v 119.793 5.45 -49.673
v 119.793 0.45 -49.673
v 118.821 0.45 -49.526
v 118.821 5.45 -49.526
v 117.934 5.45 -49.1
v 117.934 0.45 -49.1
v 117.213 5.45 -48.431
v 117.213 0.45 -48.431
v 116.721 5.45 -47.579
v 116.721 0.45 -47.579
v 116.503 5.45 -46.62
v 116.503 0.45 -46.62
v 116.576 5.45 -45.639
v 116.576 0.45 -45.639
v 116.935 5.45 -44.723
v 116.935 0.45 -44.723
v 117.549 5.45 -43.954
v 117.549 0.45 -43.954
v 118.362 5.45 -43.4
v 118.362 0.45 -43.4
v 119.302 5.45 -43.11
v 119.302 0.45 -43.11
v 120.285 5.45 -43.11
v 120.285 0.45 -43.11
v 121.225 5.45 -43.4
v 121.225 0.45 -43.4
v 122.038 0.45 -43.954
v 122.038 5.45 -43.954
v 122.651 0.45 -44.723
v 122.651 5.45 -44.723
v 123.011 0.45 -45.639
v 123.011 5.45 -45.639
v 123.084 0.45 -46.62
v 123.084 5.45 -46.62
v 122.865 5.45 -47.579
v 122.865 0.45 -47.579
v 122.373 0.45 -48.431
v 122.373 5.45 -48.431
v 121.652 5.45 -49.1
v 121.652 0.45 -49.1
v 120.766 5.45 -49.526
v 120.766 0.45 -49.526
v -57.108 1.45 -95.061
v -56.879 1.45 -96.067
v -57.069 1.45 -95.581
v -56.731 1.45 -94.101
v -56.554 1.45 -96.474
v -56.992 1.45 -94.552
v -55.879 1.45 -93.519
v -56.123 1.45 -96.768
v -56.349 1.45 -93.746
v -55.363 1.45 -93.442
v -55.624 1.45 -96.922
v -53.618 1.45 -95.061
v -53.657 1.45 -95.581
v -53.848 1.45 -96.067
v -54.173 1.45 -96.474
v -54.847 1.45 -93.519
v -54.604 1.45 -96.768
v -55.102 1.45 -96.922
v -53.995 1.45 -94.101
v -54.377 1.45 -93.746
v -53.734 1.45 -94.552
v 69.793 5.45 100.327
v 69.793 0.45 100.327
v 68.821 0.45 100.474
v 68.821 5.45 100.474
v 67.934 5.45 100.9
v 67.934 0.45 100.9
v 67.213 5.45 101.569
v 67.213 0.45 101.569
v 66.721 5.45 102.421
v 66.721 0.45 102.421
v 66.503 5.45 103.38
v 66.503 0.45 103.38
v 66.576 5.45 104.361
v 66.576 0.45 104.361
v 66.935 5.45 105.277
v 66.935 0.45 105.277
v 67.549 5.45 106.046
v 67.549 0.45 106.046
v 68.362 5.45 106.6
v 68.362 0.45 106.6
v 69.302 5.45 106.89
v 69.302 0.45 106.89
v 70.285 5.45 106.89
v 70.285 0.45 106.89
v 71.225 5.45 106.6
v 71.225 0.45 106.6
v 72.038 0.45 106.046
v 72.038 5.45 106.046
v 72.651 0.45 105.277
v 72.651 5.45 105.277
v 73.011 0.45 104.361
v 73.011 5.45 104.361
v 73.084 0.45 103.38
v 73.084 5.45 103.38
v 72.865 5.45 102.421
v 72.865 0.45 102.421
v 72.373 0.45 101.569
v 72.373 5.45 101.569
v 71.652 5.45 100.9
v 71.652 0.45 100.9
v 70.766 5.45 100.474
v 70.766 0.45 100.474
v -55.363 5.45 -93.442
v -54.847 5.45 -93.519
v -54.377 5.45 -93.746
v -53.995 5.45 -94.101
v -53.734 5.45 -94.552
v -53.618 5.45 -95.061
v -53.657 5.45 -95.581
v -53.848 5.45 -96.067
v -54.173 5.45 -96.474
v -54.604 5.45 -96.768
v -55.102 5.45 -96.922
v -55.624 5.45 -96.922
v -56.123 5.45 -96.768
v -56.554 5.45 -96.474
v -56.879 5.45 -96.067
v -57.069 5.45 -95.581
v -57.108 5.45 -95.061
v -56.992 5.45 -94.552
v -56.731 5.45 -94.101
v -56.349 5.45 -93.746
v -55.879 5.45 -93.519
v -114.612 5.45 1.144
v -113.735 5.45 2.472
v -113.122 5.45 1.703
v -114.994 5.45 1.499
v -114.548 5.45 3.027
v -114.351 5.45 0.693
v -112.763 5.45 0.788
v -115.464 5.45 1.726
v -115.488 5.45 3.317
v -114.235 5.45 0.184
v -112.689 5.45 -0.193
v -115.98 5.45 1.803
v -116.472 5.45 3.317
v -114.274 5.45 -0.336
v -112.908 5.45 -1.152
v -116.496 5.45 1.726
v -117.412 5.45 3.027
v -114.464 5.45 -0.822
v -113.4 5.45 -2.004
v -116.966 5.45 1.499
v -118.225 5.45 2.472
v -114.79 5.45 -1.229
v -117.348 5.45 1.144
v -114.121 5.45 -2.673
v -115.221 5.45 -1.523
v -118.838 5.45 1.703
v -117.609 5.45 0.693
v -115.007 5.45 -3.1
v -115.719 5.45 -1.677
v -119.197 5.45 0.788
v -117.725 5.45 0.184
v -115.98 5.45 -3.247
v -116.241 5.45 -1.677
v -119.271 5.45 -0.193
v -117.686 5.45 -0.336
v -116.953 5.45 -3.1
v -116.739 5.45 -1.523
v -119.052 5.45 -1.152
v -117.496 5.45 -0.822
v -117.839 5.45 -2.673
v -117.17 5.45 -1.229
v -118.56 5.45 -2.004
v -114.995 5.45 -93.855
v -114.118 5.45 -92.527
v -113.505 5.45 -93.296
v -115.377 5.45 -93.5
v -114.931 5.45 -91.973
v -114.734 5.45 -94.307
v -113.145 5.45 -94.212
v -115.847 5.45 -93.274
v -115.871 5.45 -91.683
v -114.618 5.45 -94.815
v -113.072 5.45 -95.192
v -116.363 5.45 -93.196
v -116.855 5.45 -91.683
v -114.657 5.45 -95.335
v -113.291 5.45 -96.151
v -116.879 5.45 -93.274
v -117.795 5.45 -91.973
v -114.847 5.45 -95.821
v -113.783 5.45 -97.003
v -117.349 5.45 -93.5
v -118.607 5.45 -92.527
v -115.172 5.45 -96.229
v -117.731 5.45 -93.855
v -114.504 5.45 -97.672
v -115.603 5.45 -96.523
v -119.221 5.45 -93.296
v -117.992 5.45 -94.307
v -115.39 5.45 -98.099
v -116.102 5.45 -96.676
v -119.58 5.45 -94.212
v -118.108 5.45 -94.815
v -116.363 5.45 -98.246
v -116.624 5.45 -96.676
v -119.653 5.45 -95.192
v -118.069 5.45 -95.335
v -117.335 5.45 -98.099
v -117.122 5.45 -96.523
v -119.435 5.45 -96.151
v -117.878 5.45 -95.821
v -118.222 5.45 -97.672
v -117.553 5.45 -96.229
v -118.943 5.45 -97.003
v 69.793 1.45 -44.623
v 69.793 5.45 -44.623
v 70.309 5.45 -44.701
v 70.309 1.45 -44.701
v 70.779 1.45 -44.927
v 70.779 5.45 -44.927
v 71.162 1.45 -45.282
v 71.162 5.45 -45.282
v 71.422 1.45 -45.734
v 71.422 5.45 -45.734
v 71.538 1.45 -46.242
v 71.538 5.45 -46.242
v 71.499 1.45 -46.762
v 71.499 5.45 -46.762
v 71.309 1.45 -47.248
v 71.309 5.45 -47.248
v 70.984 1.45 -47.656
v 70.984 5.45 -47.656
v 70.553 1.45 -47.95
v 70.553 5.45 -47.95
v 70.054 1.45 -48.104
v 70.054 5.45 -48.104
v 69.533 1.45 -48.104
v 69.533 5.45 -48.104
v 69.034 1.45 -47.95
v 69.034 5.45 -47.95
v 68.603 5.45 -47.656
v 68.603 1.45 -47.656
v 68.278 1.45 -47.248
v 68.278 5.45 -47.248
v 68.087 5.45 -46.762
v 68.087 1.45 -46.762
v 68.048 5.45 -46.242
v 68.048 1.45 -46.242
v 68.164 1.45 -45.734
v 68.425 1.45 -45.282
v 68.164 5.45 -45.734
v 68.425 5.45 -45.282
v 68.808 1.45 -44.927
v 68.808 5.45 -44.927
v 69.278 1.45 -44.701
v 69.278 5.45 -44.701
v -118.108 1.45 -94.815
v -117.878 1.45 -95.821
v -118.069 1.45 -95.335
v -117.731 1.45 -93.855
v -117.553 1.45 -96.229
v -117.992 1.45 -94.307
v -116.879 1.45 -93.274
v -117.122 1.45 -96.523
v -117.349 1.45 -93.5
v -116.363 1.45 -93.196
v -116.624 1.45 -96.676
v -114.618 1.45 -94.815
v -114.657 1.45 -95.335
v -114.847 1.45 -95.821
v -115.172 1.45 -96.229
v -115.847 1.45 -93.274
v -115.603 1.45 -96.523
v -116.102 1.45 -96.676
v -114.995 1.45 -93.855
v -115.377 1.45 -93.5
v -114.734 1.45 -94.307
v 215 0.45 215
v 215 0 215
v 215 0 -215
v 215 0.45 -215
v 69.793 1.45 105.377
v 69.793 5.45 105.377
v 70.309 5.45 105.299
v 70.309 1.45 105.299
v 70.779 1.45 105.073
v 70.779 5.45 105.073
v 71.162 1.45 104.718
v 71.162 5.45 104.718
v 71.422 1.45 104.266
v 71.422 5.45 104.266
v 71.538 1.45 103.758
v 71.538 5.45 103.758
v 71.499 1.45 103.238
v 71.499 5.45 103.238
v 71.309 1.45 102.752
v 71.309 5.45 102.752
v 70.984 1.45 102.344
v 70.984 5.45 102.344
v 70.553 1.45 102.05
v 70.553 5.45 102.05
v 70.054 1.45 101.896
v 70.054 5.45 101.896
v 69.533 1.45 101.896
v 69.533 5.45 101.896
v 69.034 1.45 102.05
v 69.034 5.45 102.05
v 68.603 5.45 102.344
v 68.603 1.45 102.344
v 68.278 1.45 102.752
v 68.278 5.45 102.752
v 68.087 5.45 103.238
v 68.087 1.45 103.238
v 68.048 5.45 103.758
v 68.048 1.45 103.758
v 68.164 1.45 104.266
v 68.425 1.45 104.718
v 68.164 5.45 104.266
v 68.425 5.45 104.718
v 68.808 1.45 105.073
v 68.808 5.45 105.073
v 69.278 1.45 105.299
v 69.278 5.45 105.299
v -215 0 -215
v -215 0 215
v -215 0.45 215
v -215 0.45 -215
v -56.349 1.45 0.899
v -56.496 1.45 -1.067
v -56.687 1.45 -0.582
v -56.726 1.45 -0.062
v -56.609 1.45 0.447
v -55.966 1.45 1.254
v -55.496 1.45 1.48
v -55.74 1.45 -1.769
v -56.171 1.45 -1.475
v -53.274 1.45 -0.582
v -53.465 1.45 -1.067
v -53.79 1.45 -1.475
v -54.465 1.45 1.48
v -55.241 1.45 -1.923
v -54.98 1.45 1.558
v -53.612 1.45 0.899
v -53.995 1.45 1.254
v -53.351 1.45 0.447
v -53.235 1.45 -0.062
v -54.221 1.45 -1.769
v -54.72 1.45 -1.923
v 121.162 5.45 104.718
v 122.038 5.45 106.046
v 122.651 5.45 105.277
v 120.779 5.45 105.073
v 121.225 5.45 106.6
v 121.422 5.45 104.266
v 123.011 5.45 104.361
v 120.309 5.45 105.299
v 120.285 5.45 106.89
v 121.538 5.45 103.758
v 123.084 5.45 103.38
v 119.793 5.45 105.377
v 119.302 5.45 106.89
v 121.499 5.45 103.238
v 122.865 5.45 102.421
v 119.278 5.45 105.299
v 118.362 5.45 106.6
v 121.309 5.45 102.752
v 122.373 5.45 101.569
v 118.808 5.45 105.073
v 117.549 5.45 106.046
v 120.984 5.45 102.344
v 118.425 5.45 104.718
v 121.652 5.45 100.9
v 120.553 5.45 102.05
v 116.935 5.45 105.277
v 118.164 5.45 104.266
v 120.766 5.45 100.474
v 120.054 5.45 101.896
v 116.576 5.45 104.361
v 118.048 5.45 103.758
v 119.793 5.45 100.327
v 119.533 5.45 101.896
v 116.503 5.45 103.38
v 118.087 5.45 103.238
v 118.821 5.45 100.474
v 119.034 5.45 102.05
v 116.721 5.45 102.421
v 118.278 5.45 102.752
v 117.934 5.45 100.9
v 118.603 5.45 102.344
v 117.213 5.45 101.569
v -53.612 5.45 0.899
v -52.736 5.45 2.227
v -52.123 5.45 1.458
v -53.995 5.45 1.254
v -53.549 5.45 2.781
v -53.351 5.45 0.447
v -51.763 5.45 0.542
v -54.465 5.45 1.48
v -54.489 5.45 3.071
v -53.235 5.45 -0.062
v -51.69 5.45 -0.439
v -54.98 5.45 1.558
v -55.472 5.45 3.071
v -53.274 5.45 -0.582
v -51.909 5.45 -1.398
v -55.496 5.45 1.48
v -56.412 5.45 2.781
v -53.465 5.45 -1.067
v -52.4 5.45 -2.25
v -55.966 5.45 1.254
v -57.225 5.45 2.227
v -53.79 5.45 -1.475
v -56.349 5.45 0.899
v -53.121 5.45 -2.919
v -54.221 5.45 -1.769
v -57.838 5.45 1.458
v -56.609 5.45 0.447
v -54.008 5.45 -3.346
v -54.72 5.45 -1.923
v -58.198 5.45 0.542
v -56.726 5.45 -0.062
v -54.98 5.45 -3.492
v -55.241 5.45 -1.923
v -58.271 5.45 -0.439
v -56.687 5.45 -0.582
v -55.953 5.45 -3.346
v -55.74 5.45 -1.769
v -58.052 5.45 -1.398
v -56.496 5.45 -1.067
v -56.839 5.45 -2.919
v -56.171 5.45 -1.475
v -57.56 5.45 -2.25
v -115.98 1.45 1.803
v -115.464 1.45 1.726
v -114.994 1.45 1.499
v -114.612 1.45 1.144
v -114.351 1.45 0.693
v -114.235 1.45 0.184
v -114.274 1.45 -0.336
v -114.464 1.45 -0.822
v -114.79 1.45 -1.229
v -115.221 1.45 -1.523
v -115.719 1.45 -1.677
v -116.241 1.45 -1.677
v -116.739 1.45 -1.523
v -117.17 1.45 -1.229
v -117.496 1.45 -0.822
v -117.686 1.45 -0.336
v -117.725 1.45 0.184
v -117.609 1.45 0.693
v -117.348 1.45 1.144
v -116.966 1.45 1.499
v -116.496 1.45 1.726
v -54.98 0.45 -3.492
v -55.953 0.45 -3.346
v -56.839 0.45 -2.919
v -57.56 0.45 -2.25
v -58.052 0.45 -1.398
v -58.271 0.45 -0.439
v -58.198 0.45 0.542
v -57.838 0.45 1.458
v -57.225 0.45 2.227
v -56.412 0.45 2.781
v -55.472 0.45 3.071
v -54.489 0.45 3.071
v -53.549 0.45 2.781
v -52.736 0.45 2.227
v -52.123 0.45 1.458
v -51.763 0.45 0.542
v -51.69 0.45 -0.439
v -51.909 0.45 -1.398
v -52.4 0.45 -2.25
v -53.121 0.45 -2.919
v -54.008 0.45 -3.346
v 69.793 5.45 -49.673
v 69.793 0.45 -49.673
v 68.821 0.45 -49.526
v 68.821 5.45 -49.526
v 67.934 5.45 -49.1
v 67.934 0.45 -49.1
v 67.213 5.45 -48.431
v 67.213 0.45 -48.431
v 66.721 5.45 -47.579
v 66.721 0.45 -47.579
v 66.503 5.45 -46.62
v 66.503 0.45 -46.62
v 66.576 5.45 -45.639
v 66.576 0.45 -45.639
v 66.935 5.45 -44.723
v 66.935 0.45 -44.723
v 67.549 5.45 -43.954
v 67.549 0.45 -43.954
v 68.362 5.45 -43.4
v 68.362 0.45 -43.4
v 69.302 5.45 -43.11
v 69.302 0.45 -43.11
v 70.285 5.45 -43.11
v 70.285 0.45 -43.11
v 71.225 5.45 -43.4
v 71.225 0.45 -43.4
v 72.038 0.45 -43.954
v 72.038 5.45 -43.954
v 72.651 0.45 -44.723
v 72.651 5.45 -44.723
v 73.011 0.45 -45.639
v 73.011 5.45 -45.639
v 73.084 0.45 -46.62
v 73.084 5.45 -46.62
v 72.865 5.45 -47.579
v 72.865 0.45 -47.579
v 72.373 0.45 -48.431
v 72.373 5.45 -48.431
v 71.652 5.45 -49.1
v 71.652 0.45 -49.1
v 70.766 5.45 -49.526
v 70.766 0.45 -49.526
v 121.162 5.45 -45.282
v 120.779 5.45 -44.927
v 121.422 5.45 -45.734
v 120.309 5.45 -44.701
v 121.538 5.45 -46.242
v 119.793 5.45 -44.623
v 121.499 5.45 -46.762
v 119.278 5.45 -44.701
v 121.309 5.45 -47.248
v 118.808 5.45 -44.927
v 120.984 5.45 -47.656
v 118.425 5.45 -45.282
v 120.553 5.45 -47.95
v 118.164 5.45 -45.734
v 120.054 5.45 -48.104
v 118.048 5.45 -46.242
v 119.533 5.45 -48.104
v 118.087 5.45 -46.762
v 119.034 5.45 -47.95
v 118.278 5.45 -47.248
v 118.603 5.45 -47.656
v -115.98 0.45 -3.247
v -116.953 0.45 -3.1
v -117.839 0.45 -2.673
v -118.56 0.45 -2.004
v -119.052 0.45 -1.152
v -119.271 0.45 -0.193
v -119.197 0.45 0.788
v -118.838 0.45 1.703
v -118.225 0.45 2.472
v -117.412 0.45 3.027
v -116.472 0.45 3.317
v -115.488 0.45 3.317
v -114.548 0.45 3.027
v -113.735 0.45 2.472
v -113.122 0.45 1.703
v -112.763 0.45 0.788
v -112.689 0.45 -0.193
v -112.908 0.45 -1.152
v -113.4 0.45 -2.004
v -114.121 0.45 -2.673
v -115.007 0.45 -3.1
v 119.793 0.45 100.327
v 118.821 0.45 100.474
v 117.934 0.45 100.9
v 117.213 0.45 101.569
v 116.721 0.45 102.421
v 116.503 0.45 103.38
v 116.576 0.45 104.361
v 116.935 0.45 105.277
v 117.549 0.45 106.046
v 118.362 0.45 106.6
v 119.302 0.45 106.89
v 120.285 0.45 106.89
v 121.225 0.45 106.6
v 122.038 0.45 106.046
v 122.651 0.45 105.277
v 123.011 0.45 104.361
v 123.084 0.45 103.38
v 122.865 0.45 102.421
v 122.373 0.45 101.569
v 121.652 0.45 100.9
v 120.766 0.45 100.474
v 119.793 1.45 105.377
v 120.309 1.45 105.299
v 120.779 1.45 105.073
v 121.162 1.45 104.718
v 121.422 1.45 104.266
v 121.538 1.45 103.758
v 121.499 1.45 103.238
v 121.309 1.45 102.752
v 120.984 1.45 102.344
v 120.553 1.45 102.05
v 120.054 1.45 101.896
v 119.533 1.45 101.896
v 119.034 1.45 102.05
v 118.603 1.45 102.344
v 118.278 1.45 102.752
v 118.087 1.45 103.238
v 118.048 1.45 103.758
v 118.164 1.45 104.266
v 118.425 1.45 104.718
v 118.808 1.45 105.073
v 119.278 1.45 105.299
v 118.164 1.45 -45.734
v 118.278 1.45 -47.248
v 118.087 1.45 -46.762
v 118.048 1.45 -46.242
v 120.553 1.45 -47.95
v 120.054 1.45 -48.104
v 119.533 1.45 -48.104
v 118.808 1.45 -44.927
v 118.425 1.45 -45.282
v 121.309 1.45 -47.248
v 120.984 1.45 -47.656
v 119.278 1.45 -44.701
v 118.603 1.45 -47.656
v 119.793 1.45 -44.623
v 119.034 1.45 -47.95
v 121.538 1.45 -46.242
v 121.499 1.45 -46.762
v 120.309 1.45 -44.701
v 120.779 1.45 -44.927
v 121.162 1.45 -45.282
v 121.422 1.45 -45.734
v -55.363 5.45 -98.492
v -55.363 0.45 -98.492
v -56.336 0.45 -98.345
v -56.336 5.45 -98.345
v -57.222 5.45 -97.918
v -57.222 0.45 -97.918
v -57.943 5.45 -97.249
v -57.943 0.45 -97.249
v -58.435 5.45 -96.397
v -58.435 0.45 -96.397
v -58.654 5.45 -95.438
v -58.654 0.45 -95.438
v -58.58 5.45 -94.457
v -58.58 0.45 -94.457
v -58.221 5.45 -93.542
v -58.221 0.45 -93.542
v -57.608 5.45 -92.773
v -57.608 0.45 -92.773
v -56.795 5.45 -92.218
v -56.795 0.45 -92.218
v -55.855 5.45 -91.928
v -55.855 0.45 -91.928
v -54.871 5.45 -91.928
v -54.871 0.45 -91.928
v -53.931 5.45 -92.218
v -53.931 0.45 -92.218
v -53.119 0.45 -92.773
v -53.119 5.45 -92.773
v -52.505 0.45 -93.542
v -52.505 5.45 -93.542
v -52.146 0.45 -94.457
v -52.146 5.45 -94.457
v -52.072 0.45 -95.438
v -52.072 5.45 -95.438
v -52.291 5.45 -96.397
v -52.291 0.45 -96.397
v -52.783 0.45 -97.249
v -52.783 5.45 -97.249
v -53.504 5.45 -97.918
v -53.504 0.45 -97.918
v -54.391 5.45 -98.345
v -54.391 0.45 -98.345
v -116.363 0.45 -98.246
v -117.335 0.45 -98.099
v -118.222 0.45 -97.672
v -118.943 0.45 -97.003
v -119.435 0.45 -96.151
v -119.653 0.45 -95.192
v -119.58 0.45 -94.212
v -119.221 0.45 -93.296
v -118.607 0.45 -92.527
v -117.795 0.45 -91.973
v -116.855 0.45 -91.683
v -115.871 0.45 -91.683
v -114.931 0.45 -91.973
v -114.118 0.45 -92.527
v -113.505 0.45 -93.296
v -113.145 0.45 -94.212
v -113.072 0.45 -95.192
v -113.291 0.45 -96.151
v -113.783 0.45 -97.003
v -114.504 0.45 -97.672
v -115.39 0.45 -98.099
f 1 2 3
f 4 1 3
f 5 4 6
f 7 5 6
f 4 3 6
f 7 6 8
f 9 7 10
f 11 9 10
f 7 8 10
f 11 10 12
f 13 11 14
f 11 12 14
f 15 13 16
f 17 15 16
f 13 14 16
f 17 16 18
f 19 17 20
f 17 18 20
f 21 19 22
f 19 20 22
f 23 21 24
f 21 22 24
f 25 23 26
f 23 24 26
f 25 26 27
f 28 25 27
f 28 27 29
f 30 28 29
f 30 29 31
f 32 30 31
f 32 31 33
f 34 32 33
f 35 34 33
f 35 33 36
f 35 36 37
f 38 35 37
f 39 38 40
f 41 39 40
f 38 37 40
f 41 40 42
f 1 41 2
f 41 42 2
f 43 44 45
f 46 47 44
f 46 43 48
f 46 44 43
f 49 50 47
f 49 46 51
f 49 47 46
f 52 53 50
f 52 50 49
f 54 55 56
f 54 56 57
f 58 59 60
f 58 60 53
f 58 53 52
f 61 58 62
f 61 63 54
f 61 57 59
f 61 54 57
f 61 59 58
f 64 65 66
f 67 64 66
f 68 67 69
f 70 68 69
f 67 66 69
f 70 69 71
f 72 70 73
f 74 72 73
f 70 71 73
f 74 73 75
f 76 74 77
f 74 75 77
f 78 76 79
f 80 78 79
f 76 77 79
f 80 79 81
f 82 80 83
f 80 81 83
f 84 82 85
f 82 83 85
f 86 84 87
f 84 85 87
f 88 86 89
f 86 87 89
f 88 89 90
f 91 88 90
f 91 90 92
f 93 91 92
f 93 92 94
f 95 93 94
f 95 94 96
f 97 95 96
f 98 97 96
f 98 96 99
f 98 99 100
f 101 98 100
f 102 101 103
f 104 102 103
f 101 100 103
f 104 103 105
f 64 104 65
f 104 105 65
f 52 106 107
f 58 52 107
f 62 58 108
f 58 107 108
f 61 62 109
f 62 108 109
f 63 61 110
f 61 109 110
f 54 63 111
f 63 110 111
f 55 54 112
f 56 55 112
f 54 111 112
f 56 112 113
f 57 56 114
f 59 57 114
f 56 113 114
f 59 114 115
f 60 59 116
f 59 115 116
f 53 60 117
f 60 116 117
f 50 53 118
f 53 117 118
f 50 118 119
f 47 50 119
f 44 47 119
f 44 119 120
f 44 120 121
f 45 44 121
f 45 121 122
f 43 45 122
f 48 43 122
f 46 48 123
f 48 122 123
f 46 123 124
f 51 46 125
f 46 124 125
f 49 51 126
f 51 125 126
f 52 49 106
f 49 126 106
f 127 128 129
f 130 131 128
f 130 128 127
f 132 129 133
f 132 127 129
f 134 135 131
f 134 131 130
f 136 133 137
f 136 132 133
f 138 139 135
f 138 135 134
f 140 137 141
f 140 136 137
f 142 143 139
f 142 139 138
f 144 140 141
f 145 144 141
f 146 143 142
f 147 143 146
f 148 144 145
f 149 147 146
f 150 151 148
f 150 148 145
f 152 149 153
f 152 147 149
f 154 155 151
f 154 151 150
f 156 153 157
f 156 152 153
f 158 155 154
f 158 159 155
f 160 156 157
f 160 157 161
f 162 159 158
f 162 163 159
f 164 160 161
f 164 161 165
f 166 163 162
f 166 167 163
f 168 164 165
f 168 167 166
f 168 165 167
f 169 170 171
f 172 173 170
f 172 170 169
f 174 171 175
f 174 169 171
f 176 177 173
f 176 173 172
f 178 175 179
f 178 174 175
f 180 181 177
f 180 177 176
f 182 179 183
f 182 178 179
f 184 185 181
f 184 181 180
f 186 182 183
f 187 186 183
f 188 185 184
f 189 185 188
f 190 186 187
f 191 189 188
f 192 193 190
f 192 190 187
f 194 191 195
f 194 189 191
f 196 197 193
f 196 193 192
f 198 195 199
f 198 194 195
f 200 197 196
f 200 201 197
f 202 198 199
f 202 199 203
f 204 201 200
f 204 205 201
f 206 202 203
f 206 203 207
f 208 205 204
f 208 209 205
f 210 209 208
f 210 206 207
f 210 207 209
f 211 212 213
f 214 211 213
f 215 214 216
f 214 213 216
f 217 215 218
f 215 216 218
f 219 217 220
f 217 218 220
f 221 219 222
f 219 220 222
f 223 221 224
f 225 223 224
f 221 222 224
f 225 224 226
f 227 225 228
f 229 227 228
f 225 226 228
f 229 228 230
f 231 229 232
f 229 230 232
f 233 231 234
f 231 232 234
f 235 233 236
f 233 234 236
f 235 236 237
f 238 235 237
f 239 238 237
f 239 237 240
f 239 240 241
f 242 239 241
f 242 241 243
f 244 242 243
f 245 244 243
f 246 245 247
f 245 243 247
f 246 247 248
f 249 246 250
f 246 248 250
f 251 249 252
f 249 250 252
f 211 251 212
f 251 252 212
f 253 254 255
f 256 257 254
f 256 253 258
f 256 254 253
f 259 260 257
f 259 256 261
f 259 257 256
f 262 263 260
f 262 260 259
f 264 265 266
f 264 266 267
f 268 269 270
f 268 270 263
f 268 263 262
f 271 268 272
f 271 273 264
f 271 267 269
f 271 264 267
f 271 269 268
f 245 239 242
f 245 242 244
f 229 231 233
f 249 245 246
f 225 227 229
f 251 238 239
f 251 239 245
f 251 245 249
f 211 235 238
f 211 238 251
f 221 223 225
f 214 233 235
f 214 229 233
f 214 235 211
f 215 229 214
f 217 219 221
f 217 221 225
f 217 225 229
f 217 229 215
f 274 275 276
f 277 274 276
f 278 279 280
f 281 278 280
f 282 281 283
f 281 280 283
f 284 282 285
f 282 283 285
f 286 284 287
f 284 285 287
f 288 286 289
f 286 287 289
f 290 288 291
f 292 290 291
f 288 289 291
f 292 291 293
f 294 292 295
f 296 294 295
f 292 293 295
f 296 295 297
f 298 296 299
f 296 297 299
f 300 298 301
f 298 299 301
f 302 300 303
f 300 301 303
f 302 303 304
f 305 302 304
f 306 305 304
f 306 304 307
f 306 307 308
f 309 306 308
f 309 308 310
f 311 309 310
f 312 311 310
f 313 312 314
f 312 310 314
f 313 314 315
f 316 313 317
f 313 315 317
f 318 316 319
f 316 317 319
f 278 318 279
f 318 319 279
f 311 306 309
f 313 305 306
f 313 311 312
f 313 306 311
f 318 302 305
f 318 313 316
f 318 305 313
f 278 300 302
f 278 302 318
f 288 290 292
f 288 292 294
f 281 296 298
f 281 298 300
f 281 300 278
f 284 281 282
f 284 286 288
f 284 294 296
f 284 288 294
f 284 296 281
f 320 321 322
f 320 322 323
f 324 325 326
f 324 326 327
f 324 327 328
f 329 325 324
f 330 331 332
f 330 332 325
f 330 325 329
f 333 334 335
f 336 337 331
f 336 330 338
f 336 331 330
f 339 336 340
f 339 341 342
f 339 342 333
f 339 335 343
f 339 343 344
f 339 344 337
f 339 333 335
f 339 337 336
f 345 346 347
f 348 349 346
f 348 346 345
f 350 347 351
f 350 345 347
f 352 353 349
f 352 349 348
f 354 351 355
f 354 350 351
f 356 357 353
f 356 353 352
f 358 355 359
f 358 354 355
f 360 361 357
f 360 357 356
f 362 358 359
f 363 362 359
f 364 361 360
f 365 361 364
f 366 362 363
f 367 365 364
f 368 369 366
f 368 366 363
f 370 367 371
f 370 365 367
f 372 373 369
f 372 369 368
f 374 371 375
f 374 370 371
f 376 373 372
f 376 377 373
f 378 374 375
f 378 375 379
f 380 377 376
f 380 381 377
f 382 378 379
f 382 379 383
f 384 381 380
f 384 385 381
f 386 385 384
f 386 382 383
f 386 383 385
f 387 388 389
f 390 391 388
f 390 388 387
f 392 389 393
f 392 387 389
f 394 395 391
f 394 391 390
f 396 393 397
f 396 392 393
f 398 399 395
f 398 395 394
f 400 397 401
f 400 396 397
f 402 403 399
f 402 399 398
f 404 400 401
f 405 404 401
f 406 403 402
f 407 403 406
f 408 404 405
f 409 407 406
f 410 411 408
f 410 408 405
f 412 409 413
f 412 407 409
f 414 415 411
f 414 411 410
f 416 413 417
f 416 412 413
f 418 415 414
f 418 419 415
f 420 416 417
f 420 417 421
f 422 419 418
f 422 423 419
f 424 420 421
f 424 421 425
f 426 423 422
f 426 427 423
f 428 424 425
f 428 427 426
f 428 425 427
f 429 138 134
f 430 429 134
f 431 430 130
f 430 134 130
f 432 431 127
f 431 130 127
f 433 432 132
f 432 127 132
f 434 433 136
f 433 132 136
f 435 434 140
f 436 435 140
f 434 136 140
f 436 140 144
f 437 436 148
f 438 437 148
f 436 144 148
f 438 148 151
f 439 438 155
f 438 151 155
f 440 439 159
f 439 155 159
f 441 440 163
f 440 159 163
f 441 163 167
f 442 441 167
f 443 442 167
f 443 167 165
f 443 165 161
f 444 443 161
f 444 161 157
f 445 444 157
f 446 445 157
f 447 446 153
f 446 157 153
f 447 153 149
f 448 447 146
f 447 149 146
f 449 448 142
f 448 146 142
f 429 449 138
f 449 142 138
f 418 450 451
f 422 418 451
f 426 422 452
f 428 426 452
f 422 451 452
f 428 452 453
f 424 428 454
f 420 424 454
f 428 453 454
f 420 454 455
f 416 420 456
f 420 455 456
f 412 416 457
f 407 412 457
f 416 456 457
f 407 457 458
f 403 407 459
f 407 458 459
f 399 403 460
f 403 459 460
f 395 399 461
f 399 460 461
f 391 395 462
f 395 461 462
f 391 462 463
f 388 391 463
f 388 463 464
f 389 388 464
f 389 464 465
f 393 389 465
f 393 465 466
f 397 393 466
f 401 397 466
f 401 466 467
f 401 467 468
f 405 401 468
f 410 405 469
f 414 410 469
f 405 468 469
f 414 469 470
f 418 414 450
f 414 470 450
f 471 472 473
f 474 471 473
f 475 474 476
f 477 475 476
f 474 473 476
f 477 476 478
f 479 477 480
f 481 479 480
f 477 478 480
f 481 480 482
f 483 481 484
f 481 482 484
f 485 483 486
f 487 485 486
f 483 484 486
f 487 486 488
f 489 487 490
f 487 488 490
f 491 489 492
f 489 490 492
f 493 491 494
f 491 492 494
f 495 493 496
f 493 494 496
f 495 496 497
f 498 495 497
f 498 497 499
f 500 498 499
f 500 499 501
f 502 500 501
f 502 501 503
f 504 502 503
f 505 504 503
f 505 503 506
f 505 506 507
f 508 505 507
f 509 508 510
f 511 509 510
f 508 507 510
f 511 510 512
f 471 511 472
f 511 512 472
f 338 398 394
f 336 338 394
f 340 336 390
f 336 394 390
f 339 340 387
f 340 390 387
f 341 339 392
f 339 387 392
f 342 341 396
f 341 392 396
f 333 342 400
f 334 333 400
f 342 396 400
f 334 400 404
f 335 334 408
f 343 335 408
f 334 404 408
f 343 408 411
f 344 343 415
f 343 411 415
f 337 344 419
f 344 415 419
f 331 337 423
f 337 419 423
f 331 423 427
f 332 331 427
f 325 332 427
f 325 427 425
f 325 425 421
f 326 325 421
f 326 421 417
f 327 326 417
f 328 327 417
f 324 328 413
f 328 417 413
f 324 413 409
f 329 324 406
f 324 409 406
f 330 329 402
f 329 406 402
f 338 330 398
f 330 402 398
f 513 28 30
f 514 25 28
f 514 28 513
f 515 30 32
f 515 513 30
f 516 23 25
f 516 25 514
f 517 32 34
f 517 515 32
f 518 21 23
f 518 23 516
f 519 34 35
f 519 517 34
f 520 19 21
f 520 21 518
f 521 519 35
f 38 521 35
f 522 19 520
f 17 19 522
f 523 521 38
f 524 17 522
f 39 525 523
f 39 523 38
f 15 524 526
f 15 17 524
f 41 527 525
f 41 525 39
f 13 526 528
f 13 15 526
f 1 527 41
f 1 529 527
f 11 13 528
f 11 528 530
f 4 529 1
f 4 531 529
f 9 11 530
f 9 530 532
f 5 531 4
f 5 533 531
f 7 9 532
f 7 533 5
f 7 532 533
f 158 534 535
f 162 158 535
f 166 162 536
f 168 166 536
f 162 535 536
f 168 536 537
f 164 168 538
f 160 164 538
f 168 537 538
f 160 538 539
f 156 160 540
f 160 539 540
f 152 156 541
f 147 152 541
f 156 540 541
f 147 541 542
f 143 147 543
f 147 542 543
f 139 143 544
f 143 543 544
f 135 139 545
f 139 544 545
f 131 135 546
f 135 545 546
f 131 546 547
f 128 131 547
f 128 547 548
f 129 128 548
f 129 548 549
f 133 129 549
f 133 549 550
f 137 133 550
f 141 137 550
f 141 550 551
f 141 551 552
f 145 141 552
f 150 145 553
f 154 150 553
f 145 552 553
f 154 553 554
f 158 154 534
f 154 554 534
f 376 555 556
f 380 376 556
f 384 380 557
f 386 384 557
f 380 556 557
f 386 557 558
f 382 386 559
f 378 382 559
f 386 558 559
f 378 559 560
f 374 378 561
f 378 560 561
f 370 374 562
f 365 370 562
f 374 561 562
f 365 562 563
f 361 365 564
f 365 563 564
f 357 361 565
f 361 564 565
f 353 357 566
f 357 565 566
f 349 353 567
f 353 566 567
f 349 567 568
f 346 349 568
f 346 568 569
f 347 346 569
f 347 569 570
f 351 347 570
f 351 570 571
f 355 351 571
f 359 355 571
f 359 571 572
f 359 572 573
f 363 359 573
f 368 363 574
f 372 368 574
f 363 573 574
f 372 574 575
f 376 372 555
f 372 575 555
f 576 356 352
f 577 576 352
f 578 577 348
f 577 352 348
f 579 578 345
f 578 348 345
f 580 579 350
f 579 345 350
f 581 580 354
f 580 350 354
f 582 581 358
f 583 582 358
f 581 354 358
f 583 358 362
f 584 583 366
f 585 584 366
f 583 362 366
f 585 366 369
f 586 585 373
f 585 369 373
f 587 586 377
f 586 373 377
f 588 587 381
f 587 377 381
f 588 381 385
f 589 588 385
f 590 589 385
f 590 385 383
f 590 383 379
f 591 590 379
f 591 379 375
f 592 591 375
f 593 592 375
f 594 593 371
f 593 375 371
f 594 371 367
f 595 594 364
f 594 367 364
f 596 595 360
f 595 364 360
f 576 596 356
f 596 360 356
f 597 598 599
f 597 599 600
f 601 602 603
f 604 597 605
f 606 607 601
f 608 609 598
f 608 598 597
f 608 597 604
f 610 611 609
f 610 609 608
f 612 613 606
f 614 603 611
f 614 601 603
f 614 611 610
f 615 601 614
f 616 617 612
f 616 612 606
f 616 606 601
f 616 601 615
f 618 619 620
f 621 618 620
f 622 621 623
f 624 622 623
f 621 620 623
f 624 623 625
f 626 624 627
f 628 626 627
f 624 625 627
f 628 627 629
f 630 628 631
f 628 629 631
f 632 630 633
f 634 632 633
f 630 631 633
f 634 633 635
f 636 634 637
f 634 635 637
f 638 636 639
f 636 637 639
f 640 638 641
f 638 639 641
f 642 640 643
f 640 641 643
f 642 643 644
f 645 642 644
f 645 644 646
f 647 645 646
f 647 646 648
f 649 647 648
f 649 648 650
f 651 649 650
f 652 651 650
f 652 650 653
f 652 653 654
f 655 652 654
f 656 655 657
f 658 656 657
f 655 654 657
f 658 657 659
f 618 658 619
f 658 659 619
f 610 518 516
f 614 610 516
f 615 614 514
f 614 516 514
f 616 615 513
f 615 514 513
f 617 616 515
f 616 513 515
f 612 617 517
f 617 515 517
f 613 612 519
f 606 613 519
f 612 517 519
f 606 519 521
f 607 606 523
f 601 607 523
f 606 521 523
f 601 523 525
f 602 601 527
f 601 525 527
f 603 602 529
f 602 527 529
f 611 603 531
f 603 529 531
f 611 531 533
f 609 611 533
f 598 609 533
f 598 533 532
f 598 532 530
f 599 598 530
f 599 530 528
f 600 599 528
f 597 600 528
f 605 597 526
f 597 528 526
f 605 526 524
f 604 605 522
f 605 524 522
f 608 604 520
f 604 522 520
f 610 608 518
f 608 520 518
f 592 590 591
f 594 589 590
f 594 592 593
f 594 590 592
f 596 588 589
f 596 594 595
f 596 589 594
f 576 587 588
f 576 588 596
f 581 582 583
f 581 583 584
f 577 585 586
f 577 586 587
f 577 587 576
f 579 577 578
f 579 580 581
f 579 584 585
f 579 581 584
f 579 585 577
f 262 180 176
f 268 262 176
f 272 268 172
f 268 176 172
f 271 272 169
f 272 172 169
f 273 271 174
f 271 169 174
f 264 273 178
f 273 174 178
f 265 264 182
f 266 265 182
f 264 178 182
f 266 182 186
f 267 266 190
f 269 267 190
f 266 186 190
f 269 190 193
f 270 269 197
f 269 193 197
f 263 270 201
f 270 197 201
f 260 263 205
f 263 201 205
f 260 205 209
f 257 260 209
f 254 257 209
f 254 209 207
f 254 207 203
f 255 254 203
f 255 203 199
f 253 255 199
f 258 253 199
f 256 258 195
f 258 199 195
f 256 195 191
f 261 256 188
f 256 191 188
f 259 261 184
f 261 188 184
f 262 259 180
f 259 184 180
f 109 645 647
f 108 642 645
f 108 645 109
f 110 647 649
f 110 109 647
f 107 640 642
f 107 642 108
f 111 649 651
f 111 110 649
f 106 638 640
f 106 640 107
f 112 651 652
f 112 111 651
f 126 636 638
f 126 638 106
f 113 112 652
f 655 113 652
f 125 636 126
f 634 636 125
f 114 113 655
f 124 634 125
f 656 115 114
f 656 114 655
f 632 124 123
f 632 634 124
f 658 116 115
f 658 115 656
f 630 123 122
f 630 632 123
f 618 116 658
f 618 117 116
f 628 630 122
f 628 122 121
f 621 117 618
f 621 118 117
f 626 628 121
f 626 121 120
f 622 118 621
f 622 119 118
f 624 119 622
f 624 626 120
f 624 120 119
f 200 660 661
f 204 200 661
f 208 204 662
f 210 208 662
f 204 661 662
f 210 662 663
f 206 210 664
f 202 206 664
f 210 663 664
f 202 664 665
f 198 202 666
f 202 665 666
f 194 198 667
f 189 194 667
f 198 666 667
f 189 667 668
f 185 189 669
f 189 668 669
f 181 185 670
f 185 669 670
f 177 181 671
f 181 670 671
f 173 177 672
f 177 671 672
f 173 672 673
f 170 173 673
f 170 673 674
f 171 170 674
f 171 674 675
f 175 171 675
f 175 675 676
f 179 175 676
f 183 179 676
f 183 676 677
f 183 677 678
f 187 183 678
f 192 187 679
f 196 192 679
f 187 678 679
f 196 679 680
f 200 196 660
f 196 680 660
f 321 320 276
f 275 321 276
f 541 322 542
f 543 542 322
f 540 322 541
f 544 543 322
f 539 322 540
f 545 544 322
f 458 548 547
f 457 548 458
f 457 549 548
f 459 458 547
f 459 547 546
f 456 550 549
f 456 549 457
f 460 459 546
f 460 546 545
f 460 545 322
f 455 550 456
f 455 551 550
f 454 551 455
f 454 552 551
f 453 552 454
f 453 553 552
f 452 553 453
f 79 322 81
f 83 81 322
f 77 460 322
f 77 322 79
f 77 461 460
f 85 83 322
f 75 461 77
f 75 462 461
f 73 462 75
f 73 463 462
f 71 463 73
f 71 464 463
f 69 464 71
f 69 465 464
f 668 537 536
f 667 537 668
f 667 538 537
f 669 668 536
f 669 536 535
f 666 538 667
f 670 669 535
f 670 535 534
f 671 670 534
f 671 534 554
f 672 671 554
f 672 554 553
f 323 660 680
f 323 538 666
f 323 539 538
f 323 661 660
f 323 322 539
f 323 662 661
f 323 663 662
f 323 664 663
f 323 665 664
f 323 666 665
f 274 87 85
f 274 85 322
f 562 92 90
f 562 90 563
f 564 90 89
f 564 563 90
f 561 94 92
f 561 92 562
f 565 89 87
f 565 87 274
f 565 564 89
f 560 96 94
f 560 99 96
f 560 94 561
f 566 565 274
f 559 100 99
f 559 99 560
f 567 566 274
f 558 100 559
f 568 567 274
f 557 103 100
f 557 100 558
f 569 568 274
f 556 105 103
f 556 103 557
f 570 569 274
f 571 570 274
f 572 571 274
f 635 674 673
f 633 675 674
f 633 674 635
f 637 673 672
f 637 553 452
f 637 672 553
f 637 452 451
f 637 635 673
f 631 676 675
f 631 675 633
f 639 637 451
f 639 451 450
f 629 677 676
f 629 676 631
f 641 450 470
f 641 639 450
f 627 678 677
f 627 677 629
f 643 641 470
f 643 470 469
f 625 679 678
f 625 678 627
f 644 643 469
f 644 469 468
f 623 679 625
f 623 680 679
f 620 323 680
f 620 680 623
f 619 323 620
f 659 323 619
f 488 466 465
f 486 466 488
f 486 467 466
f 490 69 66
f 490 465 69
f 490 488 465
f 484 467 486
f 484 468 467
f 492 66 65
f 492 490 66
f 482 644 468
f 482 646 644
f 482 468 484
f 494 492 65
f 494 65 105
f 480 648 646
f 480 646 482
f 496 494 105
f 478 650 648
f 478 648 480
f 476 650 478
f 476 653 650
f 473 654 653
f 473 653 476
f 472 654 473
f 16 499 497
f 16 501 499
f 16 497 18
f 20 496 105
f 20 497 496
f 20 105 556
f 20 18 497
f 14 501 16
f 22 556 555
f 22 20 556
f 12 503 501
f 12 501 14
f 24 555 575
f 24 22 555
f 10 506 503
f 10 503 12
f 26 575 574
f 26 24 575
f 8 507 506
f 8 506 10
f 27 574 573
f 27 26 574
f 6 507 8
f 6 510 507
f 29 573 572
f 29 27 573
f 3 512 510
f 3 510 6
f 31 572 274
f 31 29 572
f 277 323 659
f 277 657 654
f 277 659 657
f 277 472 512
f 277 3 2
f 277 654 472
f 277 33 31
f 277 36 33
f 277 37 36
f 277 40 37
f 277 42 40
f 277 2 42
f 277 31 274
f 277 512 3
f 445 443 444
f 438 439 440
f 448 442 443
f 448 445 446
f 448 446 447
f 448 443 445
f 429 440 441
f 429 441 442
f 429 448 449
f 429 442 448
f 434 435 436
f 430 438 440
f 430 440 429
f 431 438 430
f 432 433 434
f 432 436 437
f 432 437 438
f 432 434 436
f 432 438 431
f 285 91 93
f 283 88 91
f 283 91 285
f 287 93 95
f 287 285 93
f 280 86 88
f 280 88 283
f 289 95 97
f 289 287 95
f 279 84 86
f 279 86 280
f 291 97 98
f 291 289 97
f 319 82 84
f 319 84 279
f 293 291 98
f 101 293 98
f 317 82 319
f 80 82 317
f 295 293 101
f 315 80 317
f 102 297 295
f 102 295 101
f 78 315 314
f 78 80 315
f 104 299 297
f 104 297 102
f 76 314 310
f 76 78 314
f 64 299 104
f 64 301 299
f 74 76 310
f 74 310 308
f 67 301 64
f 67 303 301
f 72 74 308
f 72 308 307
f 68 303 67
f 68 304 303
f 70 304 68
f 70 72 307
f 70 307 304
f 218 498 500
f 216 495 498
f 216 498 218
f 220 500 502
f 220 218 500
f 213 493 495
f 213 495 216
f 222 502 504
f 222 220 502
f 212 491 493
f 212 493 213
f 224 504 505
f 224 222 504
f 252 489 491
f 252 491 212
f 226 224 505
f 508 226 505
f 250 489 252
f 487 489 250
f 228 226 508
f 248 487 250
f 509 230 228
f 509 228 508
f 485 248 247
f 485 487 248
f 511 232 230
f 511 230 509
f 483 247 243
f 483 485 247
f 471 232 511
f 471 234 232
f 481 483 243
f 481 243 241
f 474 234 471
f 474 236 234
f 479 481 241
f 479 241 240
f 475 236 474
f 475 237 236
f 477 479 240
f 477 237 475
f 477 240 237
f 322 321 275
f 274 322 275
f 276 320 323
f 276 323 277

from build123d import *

# Parameters (mm, degrees)
SKETCH1_W           = 430
SKETCH1_H           = 430
BOSS_EXTRUDE1_DEPTH = 0.45
SKETCH7_R           = 3.3
BOSS_EXTRUDE2_DEPTH = 5
SKETCH8_R           = 1.75
CUT_EXTRUDE1_DEPTH  = 4
SKETCH6_R           = 3.3
BOSS_EXTRUDE3_DEPTH = 5
SKETCH10_R          = 1.75
CUT_EXTRUDE2_DEPTH  = 4


with BuildPart() as part:
    # Sketch1 → Boss-Extrude1 (new body)
    with BuildSketch(Plane(origin=(0, 0, 0), x_dir=(1, 0, 0), z_dir=(0, 1, 0))):
        Rectangle(SKETCH1_W, SKETCH1_H)
    extrude(amount=BOSS_EXTRUDE1_DEPTH)

    # Sketch7 → Boss-Extrude2 (add)
    with BuildSketch(Plane(origin=(0, 0.45, 0), x_dir=(1, 0, 0), z_dir=(0, 1, 0))):
        with Locations(Location((-116.362714529, 94.945868521, 0), (0, 0, 90))):
            Circle(SKETCH7_R)
        with Locations(Location((-55.363204635, 95.191638193, 0), (0, 0, 90))):
            Circle(SKETCH7_R)
        with Locations(Location((-54.980448566, 0.192396061, 0), (0, 0, 90))):
            Circle(SKETCH7_R)
        with Locations(Location((-115.97995846, -0.053373612, 0), (0, 0, 90))):
            Circle(SKETCH7_R)
    extrude(amount=BOSS_EXTRUDE2_DEPTH)

    # Sketch8 → Cut-Extrude1 (cut)
    with BuildSketch(Plane(origin=(0, 5.45, 0), x_dir=(1, 0, 0), z_dir=(0, 1, 0))):
        with Locations(Location((-54.980448566, 0.192396061, 0), (0, 0, 270))):
            Circle(SKETCH8_R)
        with Locations(Location((-55.363204635, 95.191638193, 0), (0, 0, 270))):
            Circle(SKETCH8_R)
        with Locations(Location((-116.362714529, 94.945868521, 0), (0, 0, 270))):
            Circle(SKETCH8_R)
        with Locations(Location((-115.97995846, -0.053373612, 0), (0, 0, 270))):
            Circle(SKETCH8_R)
    extrude(amount=-CUT_EXTRUDE1_DEPTH, mode=Mode.SUBTRACT)

    # Sketch6 → Boss-Extrude3 (add)
    with BuildSketch(Plane(origin=(0, 0.45, 0), x_dir=(1, 0, 0), z_dir=(0, 1, 0))):
        with Locations(Location((119.793345796, 46.373061352, 0), (0, 0, 90))):
            Circle(SKETCH6_R)
        with Locations(Location((69.793345796, 46.373061352, 0), (0, 0, 90))):
            Circle(SKETCH6_R)
        with Locations(Location((119.793345796, -103.626938648, 0), (0, 0, 90))):
            Circle(SKETCH6_R)
        with Locations(Location((69.793345796, -103.626938648, 0), (0, 0, 90))):
            Circle(SKETCH6_R)
    extrude(amount=BOSS_EXTRUDE3_DEPTH)

    # Sketch10 → Cut-Extrude2 (cut)
    with BuildSketch(Plane(origin=(0, 5.45, 0), x_dir=(1, 0, 0), z_dir=(0, 1, 0))):
        with Locations(Location((69.793345796, 46.373061352, 0), (0, 0, 270))):
            Circle(SKETCH10_R)
        with Locations(Location((119.793345796, 46.373061352, 0), (0, 0, 270))):
            Circle(SKETCH10_R)
        with Locations(Location((119.793345796, -103.626938648, 0), (0, 0, 270))):
            Circle(SKETCH10_R)
        with Locations(Location((69.793345796, -103.626938648, 0), (0, 0, 270))):
            Circle(SKETCH10_R)
    extrude(amount=-CUT_EXTRUDE2_DEPTH, mode=Mode.SUBTRACT)


solid = part.part
